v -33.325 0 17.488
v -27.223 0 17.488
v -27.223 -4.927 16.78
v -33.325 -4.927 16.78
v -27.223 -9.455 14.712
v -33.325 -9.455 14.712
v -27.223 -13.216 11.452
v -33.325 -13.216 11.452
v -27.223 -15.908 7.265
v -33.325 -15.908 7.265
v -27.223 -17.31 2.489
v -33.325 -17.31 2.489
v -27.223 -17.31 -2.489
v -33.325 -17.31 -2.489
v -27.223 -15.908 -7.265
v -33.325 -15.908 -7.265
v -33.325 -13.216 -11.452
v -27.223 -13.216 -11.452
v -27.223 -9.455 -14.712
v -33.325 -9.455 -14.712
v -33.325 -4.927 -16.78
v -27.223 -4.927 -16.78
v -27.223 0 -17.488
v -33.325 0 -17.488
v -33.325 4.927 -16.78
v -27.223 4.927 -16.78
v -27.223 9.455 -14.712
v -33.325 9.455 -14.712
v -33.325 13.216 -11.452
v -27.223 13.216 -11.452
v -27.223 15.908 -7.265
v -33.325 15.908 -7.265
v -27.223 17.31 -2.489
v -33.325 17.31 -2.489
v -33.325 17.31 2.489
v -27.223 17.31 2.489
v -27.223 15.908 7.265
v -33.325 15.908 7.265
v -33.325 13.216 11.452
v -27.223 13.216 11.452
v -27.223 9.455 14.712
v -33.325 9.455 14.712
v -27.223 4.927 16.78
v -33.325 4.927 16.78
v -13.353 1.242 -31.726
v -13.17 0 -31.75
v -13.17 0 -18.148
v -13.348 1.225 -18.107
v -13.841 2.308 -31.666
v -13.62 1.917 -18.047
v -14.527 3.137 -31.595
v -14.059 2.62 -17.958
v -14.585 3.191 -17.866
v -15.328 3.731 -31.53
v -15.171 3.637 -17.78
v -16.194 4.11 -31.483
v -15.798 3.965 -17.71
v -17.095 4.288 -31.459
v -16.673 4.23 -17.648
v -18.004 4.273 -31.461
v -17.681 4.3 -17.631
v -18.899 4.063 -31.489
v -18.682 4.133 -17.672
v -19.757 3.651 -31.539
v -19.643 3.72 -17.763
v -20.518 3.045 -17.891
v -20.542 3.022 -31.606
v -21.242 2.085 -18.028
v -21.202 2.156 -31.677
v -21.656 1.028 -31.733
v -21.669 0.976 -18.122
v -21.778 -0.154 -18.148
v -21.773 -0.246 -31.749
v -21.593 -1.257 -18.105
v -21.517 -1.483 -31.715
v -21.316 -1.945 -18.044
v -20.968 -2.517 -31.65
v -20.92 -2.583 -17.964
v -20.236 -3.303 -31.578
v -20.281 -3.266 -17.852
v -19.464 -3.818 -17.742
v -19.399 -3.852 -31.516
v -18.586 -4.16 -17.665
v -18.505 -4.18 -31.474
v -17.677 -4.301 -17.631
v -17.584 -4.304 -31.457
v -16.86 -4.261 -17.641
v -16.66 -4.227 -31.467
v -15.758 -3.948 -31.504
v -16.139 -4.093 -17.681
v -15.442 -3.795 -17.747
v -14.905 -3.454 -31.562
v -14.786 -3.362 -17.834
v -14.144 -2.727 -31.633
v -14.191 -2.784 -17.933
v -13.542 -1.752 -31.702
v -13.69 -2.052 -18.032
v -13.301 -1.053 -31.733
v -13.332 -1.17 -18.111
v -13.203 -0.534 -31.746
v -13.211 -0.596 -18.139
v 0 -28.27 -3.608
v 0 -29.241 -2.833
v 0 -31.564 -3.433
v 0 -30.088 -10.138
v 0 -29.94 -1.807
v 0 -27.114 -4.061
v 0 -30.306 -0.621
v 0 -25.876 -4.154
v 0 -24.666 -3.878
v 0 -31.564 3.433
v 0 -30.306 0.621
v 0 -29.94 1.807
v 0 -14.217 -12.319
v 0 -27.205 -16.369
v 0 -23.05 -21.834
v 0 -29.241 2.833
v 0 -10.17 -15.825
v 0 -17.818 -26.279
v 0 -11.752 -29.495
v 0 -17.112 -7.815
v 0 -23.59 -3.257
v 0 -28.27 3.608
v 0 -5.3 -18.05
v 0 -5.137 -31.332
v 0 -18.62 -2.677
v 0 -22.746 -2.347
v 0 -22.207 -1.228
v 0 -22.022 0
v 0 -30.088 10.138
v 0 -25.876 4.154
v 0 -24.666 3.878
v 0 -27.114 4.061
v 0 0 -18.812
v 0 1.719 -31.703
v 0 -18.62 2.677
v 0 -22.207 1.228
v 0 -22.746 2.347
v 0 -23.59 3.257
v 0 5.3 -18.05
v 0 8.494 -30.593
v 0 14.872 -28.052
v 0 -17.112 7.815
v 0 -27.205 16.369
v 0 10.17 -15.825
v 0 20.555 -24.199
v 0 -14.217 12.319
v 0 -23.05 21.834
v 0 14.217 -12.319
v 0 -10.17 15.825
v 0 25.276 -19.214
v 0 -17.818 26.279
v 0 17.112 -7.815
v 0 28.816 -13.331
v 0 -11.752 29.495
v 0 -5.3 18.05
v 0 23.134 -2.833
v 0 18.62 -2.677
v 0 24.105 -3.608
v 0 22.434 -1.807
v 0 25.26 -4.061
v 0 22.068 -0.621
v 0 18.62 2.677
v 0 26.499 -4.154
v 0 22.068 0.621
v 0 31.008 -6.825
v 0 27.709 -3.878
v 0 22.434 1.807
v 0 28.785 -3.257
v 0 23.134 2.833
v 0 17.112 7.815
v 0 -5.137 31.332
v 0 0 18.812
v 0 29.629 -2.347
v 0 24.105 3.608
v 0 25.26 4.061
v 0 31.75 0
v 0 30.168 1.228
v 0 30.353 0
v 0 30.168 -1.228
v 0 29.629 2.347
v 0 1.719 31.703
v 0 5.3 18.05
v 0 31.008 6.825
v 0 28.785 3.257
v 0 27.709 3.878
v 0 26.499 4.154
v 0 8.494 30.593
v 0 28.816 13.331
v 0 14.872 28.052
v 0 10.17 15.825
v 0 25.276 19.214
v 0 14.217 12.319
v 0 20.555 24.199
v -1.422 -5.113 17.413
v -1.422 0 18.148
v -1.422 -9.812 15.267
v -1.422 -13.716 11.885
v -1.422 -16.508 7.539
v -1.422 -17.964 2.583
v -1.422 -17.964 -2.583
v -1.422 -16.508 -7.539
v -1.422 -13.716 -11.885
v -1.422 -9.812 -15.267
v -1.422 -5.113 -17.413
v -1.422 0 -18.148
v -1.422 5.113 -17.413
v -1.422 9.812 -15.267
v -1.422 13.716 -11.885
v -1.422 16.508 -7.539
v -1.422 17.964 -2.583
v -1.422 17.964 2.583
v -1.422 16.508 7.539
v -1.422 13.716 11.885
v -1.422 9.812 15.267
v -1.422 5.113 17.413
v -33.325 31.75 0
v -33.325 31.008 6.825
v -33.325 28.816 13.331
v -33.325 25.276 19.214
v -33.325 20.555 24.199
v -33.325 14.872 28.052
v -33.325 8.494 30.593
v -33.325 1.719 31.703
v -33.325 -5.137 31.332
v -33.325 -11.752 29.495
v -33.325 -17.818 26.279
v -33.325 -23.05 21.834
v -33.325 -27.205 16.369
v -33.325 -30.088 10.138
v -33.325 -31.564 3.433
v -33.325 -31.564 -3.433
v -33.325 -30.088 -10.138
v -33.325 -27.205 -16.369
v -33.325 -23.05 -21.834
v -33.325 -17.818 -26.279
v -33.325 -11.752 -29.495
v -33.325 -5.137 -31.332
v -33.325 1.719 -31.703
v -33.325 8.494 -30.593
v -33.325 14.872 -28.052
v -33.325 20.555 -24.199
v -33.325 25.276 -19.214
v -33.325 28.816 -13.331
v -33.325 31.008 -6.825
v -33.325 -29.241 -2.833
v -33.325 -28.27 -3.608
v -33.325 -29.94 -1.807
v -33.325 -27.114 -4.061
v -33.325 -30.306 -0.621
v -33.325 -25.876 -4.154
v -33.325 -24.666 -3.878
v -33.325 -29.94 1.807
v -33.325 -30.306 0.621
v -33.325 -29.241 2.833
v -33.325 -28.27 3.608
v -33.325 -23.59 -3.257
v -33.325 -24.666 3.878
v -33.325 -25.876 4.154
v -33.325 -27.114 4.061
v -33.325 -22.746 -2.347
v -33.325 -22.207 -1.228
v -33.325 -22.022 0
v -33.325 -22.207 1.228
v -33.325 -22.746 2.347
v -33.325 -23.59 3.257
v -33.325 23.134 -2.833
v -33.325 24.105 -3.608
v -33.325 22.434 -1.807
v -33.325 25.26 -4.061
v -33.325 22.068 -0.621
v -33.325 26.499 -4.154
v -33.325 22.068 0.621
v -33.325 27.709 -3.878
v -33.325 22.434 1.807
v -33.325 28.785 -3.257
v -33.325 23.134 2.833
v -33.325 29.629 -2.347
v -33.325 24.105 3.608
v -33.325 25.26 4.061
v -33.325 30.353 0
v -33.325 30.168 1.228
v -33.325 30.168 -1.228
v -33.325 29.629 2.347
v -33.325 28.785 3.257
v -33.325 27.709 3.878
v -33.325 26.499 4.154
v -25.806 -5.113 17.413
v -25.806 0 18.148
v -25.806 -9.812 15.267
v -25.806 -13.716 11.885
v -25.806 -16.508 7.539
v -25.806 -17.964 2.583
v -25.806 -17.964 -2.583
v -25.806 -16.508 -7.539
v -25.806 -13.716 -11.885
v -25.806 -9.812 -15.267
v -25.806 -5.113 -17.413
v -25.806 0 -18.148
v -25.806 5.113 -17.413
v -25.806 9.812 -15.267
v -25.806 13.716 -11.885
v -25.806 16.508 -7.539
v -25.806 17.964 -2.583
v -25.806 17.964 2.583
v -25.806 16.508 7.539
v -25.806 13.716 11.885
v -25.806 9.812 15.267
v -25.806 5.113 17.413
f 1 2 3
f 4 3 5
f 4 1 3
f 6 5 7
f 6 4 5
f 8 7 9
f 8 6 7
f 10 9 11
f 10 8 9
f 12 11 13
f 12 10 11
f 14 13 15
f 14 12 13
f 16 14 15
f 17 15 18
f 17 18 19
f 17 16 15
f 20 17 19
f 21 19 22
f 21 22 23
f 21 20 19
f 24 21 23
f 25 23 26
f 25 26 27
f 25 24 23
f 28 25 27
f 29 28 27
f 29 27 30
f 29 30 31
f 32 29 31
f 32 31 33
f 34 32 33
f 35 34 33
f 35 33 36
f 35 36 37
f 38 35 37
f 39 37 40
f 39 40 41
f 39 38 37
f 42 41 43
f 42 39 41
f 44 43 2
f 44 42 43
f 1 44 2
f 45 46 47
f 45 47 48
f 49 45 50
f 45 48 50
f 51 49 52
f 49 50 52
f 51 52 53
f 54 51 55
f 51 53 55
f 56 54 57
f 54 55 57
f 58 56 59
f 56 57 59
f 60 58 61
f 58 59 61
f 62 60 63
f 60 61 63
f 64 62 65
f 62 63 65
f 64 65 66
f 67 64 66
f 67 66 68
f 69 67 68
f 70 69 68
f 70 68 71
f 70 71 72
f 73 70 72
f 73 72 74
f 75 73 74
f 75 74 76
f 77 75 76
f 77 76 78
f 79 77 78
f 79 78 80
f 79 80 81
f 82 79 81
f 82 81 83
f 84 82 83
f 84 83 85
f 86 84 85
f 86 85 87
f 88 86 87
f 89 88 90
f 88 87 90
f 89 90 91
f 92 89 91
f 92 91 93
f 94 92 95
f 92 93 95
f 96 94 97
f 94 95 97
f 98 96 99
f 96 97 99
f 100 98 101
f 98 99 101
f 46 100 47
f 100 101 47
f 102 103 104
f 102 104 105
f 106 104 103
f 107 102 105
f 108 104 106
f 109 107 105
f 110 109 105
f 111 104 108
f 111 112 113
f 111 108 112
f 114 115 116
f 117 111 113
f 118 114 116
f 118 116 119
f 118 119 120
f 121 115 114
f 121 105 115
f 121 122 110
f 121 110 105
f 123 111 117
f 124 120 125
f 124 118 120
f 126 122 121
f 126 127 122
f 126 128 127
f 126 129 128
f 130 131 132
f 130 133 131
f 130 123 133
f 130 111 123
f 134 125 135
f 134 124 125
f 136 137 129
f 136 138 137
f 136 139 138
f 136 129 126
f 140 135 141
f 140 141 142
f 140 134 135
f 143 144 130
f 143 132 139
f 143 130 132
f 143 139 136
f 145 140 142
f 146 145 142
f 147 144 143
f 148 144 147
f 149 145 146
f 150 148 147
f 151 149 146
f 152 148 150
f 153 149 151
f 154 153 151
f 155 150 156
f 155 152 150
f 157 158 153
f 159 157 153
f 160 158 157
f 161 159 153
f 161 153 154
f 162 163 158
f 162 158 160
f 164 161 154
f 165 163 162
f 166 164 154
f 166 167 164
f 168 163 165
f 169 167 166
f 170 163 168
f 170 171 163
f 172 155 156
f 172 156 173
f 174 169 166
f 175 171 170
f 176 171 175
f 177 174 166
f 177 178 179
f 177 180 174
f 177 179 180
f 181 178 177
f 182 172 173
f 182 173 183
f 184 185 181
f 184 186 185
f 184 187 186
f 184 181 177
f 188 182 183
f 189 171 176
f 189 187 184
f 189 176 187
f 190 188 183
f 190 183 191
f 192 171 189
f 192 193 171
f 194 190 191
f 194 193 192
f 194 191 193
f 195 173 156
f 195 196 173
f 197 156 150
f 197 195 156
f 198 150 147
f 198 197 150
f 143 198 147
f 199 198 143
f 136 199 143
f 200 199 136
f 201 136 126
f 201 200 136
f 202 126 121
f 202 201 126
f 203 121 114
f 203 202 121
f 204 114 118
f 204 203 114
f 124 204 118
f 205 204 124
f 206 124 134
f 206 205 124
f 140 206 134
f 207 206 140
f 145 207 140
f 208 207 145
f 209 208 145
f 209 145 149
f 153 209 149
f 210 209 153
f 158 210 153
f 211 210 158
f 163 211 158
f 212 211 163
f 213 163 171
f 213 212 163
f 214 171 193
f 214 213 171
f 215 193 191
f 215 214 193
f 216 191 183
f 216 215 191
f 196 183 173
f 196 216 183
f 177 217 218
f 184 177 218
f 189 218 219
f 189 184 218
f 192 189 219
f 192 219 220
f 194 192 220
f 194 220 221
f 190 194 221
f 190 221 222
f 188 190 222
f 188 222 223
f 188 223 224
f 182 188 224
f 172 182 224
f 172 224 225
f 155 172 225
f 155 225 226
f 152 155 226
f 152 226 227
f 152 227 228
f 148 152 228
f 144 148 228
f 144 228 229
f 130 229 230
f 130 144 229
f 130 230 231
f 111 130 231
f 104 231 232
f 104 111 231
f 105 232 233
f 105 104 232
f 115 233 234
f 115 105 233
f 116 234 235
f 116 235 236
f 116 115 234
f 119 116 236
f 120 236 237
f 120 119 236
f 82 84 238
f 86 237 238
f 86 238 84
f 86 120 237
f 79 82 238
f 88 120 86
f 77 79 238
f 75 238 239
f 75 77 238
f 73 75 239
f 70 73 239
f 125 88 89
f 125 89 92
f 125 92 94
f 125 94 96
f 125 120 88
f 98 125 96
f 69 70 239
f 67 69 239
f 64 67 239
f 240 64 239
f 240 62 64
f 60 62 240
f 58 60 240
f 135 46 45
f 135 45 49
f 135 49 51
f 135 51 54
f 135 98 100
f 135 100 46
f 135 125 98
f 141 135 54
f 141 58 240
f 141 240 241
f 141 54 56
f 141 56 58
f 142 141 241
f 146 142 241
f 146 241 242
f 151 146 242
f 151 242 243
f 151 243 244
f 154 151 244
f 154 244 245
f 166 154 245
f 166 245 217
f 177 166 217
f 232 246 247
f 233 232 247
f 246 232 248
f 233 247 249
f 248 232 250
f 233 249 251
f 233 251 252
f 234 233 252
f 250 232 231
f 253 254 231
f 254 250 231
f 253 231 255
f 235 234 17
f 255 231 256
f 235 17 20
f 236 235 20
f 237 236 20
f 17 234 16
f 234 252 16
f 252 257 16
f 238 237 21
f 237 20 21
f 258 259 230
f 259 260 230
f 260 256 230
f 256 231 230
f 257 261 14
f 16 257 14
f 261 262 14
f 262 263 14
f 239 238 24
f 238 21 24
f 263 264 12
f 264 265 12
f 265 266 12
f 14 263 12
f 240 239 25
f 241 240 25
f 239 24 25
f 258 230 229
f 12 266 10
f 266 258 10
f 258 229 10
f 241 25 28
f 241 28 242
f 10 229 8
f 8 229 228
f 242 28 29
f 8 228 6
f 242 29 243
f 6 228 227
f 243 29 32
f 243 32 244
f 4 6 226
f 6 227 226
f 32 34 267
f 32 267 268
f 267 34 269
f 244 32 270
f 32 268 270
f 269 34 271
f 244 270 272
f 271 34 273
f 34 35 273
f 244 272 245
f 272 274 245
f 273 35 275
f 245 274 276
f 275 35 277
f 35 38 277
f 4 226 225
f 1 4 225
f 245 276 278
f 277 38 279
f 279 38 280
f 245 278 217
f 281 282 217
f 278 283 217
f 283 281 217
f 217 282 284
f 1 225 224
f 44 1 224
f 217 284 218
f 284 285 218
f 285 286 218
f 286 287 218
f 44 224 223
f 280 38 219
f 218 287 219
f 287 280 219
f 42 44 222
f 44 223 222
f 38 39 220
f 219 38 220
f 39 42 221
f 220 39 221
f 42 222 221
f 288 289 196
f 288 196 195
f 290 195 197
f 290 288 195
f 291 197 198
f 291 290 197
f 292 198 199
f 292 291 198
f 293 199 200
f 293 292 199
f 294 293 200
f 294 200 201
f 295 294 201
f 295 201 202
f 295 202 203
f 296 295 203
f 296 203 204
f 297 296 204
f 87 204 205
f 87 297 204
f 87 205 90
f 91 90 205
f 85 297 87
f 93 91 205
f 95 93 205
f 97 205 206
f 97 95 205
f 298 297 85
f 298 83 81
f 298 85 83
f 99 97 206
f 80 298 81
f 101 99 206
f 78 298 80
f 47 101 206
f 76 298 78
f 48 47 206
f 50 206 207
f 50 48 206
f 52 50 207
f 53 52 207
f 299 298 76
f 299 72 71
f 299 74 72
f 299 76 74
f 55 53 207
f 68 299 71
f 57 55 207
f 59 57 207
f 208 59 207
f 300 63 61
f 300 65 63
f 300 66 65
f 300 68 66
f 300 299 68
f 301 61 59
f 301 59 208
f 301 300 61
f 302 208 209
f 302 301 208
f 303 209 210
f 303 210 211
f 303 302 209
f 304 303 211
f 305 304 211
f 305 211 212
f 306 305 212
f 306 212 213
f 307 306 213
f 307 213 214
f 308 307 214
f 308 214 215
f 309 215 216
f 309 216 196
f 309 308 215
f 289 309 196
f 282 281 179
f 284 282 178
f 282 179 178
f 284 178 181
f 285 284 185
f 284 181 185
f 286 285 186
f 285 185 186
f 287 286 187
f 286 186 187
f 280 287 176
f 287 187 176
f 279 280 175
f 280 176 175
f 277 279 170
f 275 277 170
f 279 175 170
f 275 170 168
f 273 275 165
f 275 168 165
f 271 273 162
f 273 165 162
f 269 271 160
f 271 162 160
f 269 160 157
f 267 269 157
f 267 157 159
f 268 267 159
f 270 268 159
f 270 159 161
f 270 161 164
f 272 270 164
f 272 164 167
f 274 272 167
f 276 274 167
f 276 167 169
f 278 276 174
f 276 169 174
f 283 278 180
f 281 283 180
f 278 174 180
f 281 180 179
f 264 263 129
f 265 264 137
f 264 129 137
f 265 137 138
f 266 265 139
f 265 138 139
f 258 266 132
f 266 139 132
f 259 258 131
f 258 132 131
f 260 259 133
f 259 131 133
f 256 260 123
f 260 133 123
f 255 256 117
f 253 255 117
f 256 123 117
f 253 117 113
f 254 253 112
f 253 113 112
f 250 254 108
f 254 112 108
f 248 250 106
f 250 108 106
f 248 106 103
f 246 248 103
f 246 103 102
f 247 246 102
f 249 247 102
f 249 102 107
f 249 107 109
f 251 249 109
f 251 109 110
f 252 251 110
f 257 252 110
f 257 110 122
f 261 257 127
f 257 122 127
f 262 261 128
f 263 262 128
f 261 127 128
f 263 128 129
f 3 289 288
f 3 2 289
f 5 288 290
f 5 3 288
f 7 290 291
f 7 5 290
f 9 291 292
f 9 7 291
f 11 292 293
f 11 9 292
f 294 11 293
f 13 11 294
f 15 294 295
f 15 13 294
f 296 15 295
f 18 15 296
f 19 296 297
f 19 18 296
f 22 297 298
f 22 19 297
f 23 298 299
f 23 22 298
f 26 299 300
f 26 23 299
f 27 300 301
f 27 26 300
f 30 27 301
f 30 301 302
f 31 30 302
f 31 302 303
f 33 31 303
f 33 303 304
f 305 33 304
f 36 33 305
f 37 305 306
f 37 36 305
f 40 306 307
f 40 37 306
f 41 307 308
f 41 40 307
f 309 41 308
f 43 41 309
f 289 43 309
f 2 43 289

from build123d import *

# Parameters (mm, degrees)
F0_R     = 31.75
F0_R_2   = 4.1656
F1_DEPTH = 33.3248
F4_R     = 4.3053
F5_DEPTH = 32.512


with BuildPart() as f1:
    # F0 (on Right) → F1 (new body)
    with BuildSketch(Plane.YZ):
        Circle(F0_R)
        with Locations((-26.1874, 0)):
            Circle(F0_R_2, mode=Mode.SUBTRACT)
        with Locations((26.1874, 0)):
            Circle(F0_R_2, mode=Mode.SUBTRACT)
    extrude(amount=-F1_DEPTH)

    # F2 (on Front) → F3 (revolve, cut)
    with BuildSketch(Plane.XZ):
        Polygon((0, 18.811576), (-1.4224, 18.1483), (-25.8064, 18.1483), (-27.222632, 17.4879), (-34.925, 17.4879), (-34.925, 0), (0, 0), align=None)
    revolve(axis=Axis((-17.4625, 0, 0), (1, 0, 0)), mode=Mode.SUBTRACT)

    # F4 (on Top) → F5 (cut)
    with BuildSketch(Plane.XY):
        with Locations((-17.4752, 0)):
            Circle(F4_R)
    extrude(amount=-F5_DEPTH, mode=Mode.SUBTRACT)


solid = f1.part
